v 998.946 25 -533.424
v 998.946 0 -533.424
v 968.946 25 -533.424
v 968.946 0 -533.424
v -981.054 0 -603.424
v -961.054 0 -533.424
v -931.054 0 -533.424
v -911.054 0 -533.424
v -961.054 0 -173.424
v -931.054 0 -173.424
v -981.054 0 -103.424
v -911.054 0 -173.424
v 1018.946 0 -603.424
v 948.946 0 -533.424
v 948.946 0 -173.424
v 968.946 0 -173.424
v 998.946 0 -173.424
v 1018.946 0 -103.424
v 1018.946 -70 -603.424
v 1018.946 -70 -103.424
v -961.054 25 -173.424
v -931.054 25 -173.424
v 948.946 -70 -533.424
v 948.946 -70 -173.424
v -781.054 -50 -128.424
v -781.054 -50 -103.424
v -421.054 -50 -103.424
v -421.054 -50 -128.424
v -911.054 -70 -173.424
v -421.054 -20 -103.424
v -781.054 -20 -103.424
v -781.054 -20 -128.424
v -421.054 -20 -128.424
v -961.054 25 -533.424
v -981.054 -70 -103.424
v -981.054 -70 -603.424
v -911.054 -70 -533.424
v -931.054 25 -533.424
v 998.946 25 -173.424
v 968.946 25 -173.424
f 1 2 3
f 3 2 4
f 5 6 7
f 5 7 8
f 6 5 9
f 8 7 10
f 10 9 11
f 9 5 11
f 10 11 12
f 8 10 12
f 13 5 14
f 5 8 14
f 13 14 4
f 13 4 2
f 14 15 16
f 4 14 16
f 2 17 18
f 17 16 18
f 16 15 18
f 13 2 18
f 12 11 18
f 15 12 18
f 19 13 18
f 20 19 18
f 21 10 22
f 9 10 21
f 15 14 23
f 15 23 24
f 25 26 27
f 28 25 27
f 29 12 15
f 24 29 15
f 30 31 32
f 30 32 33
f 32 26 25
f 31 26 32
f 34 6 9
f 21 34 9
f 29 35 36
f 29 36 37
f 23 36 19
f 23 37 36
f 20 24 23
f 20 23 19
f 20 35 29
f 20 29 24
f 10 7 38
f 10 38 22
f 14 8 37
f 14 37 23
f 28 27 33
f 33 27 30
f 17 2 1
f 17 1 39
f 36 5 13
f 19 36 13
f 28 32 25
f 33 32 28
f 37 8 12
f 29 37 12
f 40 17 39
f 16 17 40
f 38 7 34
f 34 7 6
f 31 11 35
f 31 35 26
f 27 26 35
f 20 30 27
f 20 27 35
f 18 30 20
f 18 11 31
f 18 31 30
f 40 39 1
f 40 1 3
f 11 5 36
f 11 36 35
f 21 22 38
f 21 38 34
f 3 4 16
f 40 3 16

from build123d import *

# Parameters (mm, degrees)
F0_W     = 2000
F0_H     = 500
F0_W_2   = 1860
F0_H_2   = 360
F1_DEPTH = 70
F2_W     = 30
F2_H     = 360
F3_DEPTH = 25
F4_DEPTH = 25
F5_W     = 360
F5_H     = 30
F6_DEPTH = 25


with BuildPart() as f1:
    # F0 (on Front) → F1 (new body)
    with BuildSketch(Plane.XZ):
        with Locations((18.946081, -353.424408)):
            Rectangle(F0_W, F0_H)
        with Locations((18.946081, -353.424408)):
            Rectangle(F0_W_2, F0_H_2, mode=Mode.SUBTRACT)
    extrude(amount=F1_DEPTH)



with BuildPart() as f3:
    # F2 (on face) → F3 (new body)
    with BuildSketch(Plane(origin=(0, 0, 0), x_dir=(-1, 0, 0), z_dir=(0, 1, 0))):
        with Locations((946.053919, -353.424408)):
            Rectangle(F2_W, F2_H)
    extrude(amount=-F3_DEPTH)


with BuildPart() as f1_1:
    add(f1.part)

    add(f3.part)  # F4 merges F3
    # F2 (on face) → F4 (join)
    with BuildSketch(Plane(origin=(0, 0, 0), x_dir=(-1, 0, 0), z_dir=(0, 1, 0))):
        with Locations((-983.946081, -353.424408)):
            Rectangle(F2_W, F2_H)
        with Locations((946.053919, -353.424408)):
            Rectangle(F2_W, F2_H)
    extrude(amount=F4_DEPTH)

    # F5 (on face) → F6 (cut)
    with BuildSketch(Plane.XY.offset(-103.424408)):
        with Locations((-601.053919, -35)):
            Rectangle(F5_W, F5_H)
    extrude(amount=-F6_DEPTH, mode=Mode.SUBTRACT)


solid = f1_1.part
